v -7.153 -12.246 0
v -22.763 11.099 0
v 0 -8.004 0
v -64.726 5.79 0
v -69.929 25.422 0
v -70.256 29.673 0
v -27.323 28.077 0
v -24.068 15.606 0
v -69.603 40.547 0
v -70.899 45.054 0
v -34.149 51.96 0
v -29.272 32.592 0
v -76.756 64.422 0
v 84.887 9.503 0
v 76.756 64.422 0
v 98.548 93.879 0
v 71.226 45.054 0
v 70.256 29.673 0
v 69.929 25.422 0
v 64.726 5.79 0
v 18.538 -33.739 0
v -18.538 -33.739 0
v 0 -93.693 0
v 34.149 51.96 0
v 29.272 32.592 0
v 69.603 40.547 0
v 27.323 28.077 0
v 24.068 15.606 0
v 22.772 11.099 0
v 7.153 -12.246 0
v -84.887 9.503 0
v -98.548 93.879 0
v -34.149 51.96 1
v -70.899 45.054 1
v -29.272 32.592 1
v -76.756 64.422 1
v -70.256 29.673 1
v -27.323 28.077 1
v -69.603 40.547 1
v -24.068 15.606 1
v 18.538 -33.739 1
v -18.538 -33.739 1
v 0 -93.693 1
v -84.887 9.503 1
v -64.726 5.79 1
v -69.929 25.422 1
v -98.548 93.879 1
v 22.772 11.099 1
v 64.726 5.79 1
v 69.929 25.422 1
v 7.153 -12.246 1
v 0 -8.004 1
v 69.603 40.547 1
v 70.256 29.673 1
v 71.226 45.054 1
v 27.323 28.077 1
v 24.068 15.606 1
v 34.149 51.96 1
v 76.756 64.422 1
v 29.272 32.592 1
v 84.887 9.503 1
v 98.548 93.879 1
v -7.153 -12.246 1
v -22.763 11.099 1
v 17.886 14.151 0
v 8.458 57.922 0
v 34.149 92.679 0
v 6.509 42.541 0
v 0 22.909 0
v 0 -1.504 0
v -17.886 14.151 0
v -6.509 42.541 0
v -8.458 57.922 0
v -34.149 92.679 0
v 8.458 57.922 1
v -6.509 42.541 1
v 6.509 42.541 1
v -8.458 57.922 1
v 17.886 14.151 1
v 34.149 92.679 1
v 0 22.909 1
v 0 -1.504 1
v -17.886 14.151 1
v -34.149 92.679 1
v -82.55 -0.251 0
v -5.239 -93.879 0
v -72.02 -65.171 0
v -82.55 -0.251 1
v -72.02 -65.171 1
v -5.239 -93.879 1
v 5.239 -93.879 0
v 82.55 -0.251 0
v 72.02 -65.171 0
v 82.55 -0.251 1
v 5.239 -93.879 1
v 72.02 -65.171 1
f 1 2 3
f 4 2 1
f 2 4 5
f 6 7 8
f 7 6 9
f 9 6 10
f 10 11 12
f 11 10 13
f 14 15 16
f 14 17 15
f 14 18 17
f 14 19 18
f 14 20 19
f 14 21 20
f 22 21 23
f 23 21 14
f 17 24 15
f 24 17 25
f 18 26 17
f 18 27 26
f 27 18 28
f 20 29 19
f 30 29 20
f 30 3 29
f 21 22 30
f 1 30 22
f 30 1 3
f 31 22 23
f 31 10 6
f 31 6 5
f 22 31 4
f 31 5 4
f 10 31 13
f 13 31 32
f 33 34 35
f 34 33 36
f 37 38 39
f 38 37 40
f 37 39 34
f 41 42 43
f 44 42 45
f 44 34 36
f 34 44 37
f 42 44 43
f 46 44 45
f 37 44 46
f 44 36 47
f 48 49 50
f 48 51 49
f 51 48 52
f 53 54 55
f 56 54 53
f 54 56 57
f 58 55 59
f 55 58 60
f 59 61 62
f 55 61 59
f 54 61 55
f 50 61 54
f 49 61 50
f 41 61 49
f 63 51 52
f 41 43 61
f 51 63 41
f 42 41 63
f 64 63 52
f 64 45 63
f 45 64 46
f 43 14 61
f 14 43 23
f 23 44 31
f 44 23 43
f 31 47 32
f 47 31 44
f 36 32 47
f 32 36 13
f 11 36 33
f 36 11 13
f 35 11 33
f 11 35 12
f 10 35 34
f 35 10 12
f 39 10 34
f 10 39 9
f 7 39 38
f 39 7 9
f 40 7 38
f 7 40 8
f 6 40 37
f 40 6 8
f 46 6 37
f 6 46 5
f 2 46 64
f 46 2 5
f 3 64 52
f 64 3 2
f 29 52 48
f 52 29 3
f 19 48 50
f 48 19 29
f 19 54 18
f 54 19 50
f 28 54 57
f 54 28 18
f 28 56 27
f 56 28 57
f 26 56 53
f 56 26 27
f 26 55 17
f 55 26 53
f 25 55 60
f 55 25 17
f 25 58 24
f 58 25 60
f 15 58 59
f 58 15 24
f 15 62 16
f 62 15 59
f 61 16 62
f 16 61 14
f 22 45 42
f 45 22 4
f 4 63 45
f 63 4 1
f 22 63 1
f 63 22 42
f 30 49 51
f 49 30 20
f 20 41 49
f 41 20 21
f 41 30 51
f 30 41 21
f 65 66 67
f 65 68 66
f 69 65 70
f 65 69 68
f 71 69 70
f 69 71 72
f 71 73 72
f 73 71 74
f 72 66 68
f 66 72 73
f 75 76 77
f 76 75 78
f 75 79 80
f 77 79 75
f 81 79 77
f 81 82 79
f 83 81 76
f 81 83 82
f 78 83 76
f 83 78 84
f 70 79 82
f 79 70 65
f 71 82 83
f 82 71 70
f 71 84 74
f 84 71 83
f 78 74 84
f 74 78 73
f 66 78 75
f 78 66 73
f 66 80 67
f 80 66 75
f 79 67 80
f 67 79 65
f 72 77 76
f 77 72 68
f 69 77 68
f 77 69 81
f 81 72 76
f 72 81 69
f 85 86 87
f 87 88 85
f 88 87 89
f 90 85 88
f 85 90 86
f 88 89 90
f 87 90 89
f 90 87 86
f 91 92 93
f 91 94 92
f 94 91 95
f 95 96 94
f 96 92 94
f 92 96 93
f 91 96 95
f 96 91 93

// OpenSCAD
// file: ../decepticon_stamp.scad
// Module names are of the form poly_<inkscape-path-id>().  As a result,
// you can associate a polygon in this OpenSCAD program with the corresponding
// SVG element in the Inkscape document by looking for the XML element with
// the attribute id="inkscape-path-id".

// fudge value is used to ensure that subtracted solids are a tad taller
// in the z dimension than the polygon being subtracted from.  This helps
// keep the resulting .stl file manifold.

//plbogen_deceopticonStamp();

module plbogen_deceopticonStamp(fudge = 0.1, h=1)
{
  scale([25.4/90, -25.4/90, 1]) union()
  {
    difference()
    {
       linear_extrude(height=h)
         polygon([[-349.187500,-332.640645],[-300.781200,-33.671895],[0.000001,331.984345],[300.781301,-33.671895],[349.187501,-332.640645],[271.968801,-228.265645],[121.000001,-184.109395],[103.718801,-115.484395],[252.375001,-159.640695],[246.625001,-143.671895],[96.812501,-99.484395],[85.281301,-55.296895],[248.937501,-105.140695],[247.781301,-90.078195],[80.687501,-39.328195],[0.000001,28.359305],[-80.656199,-39.328195],[-247.781199,-90.078195],[-248.937499,-105.140695],[-85.281199,-55.296895],[-96.812499,-99.484395],[-246.624999,-143.671895],[-251.218699,-159.640695],[-103.718699,-115.484395],[-120.999999,-184.109395],[-271.968699,-228.265645],[-349.187500,-332.640645]]);
       translate([0, 0, -fudge])
         linear_extrude(height=h+2*fudge)
           polygon([[-229.343700,-20.515695],[-25.343700,43.390605],[-65.687500,119.546805],[-229.343700,-20.515695]]);
       translate([0, 0, -fudge])
         linear_extrude(height=h+2*fudge)
           polygon([[229.343800,-20.515695],[65.687500,119.546805],[25.343800,43.390605],[229.343800,-20.515695]]);
    }
    difference()
    {
       linear_extrude(height=h)
         polygon([[-121.000000,-328.390645],[-63.375000,-50.140695],[0.000000,5.328105],[63.375000,-50.140695],[121.000000,-328.390645],[29.968800,-205.234395],[0.000000,-205.234395],[-29.968700,-205.234395],[-121.000000,-328.390645]]);
       translate([0, 0, -fudge])
         linear_extrude(height=h+2*fudge)
           polygon([[-23.062500,-150.734395],[0.000000,-150.734395],[23.062500,-150.734395],[0.000000,-81.171895],[-23.062500,-150.734395]]);
    }
    linear_extrude(height=h)
      polygon([[-292.500001,0.890605],[-255.187500,230.921805],[-18.562500,332.640645],[-292.500000,0.890605]]);
    linear_extrude(height=h)
      polygon([[292.500000,0.890605],[18.562500,332.640645],[255.187500,230.921805],[292.500000,0.890605]]);
  }
}
// main file
use <../decepticon_stamp.scad>

plbogen_deceopticonStamp();
